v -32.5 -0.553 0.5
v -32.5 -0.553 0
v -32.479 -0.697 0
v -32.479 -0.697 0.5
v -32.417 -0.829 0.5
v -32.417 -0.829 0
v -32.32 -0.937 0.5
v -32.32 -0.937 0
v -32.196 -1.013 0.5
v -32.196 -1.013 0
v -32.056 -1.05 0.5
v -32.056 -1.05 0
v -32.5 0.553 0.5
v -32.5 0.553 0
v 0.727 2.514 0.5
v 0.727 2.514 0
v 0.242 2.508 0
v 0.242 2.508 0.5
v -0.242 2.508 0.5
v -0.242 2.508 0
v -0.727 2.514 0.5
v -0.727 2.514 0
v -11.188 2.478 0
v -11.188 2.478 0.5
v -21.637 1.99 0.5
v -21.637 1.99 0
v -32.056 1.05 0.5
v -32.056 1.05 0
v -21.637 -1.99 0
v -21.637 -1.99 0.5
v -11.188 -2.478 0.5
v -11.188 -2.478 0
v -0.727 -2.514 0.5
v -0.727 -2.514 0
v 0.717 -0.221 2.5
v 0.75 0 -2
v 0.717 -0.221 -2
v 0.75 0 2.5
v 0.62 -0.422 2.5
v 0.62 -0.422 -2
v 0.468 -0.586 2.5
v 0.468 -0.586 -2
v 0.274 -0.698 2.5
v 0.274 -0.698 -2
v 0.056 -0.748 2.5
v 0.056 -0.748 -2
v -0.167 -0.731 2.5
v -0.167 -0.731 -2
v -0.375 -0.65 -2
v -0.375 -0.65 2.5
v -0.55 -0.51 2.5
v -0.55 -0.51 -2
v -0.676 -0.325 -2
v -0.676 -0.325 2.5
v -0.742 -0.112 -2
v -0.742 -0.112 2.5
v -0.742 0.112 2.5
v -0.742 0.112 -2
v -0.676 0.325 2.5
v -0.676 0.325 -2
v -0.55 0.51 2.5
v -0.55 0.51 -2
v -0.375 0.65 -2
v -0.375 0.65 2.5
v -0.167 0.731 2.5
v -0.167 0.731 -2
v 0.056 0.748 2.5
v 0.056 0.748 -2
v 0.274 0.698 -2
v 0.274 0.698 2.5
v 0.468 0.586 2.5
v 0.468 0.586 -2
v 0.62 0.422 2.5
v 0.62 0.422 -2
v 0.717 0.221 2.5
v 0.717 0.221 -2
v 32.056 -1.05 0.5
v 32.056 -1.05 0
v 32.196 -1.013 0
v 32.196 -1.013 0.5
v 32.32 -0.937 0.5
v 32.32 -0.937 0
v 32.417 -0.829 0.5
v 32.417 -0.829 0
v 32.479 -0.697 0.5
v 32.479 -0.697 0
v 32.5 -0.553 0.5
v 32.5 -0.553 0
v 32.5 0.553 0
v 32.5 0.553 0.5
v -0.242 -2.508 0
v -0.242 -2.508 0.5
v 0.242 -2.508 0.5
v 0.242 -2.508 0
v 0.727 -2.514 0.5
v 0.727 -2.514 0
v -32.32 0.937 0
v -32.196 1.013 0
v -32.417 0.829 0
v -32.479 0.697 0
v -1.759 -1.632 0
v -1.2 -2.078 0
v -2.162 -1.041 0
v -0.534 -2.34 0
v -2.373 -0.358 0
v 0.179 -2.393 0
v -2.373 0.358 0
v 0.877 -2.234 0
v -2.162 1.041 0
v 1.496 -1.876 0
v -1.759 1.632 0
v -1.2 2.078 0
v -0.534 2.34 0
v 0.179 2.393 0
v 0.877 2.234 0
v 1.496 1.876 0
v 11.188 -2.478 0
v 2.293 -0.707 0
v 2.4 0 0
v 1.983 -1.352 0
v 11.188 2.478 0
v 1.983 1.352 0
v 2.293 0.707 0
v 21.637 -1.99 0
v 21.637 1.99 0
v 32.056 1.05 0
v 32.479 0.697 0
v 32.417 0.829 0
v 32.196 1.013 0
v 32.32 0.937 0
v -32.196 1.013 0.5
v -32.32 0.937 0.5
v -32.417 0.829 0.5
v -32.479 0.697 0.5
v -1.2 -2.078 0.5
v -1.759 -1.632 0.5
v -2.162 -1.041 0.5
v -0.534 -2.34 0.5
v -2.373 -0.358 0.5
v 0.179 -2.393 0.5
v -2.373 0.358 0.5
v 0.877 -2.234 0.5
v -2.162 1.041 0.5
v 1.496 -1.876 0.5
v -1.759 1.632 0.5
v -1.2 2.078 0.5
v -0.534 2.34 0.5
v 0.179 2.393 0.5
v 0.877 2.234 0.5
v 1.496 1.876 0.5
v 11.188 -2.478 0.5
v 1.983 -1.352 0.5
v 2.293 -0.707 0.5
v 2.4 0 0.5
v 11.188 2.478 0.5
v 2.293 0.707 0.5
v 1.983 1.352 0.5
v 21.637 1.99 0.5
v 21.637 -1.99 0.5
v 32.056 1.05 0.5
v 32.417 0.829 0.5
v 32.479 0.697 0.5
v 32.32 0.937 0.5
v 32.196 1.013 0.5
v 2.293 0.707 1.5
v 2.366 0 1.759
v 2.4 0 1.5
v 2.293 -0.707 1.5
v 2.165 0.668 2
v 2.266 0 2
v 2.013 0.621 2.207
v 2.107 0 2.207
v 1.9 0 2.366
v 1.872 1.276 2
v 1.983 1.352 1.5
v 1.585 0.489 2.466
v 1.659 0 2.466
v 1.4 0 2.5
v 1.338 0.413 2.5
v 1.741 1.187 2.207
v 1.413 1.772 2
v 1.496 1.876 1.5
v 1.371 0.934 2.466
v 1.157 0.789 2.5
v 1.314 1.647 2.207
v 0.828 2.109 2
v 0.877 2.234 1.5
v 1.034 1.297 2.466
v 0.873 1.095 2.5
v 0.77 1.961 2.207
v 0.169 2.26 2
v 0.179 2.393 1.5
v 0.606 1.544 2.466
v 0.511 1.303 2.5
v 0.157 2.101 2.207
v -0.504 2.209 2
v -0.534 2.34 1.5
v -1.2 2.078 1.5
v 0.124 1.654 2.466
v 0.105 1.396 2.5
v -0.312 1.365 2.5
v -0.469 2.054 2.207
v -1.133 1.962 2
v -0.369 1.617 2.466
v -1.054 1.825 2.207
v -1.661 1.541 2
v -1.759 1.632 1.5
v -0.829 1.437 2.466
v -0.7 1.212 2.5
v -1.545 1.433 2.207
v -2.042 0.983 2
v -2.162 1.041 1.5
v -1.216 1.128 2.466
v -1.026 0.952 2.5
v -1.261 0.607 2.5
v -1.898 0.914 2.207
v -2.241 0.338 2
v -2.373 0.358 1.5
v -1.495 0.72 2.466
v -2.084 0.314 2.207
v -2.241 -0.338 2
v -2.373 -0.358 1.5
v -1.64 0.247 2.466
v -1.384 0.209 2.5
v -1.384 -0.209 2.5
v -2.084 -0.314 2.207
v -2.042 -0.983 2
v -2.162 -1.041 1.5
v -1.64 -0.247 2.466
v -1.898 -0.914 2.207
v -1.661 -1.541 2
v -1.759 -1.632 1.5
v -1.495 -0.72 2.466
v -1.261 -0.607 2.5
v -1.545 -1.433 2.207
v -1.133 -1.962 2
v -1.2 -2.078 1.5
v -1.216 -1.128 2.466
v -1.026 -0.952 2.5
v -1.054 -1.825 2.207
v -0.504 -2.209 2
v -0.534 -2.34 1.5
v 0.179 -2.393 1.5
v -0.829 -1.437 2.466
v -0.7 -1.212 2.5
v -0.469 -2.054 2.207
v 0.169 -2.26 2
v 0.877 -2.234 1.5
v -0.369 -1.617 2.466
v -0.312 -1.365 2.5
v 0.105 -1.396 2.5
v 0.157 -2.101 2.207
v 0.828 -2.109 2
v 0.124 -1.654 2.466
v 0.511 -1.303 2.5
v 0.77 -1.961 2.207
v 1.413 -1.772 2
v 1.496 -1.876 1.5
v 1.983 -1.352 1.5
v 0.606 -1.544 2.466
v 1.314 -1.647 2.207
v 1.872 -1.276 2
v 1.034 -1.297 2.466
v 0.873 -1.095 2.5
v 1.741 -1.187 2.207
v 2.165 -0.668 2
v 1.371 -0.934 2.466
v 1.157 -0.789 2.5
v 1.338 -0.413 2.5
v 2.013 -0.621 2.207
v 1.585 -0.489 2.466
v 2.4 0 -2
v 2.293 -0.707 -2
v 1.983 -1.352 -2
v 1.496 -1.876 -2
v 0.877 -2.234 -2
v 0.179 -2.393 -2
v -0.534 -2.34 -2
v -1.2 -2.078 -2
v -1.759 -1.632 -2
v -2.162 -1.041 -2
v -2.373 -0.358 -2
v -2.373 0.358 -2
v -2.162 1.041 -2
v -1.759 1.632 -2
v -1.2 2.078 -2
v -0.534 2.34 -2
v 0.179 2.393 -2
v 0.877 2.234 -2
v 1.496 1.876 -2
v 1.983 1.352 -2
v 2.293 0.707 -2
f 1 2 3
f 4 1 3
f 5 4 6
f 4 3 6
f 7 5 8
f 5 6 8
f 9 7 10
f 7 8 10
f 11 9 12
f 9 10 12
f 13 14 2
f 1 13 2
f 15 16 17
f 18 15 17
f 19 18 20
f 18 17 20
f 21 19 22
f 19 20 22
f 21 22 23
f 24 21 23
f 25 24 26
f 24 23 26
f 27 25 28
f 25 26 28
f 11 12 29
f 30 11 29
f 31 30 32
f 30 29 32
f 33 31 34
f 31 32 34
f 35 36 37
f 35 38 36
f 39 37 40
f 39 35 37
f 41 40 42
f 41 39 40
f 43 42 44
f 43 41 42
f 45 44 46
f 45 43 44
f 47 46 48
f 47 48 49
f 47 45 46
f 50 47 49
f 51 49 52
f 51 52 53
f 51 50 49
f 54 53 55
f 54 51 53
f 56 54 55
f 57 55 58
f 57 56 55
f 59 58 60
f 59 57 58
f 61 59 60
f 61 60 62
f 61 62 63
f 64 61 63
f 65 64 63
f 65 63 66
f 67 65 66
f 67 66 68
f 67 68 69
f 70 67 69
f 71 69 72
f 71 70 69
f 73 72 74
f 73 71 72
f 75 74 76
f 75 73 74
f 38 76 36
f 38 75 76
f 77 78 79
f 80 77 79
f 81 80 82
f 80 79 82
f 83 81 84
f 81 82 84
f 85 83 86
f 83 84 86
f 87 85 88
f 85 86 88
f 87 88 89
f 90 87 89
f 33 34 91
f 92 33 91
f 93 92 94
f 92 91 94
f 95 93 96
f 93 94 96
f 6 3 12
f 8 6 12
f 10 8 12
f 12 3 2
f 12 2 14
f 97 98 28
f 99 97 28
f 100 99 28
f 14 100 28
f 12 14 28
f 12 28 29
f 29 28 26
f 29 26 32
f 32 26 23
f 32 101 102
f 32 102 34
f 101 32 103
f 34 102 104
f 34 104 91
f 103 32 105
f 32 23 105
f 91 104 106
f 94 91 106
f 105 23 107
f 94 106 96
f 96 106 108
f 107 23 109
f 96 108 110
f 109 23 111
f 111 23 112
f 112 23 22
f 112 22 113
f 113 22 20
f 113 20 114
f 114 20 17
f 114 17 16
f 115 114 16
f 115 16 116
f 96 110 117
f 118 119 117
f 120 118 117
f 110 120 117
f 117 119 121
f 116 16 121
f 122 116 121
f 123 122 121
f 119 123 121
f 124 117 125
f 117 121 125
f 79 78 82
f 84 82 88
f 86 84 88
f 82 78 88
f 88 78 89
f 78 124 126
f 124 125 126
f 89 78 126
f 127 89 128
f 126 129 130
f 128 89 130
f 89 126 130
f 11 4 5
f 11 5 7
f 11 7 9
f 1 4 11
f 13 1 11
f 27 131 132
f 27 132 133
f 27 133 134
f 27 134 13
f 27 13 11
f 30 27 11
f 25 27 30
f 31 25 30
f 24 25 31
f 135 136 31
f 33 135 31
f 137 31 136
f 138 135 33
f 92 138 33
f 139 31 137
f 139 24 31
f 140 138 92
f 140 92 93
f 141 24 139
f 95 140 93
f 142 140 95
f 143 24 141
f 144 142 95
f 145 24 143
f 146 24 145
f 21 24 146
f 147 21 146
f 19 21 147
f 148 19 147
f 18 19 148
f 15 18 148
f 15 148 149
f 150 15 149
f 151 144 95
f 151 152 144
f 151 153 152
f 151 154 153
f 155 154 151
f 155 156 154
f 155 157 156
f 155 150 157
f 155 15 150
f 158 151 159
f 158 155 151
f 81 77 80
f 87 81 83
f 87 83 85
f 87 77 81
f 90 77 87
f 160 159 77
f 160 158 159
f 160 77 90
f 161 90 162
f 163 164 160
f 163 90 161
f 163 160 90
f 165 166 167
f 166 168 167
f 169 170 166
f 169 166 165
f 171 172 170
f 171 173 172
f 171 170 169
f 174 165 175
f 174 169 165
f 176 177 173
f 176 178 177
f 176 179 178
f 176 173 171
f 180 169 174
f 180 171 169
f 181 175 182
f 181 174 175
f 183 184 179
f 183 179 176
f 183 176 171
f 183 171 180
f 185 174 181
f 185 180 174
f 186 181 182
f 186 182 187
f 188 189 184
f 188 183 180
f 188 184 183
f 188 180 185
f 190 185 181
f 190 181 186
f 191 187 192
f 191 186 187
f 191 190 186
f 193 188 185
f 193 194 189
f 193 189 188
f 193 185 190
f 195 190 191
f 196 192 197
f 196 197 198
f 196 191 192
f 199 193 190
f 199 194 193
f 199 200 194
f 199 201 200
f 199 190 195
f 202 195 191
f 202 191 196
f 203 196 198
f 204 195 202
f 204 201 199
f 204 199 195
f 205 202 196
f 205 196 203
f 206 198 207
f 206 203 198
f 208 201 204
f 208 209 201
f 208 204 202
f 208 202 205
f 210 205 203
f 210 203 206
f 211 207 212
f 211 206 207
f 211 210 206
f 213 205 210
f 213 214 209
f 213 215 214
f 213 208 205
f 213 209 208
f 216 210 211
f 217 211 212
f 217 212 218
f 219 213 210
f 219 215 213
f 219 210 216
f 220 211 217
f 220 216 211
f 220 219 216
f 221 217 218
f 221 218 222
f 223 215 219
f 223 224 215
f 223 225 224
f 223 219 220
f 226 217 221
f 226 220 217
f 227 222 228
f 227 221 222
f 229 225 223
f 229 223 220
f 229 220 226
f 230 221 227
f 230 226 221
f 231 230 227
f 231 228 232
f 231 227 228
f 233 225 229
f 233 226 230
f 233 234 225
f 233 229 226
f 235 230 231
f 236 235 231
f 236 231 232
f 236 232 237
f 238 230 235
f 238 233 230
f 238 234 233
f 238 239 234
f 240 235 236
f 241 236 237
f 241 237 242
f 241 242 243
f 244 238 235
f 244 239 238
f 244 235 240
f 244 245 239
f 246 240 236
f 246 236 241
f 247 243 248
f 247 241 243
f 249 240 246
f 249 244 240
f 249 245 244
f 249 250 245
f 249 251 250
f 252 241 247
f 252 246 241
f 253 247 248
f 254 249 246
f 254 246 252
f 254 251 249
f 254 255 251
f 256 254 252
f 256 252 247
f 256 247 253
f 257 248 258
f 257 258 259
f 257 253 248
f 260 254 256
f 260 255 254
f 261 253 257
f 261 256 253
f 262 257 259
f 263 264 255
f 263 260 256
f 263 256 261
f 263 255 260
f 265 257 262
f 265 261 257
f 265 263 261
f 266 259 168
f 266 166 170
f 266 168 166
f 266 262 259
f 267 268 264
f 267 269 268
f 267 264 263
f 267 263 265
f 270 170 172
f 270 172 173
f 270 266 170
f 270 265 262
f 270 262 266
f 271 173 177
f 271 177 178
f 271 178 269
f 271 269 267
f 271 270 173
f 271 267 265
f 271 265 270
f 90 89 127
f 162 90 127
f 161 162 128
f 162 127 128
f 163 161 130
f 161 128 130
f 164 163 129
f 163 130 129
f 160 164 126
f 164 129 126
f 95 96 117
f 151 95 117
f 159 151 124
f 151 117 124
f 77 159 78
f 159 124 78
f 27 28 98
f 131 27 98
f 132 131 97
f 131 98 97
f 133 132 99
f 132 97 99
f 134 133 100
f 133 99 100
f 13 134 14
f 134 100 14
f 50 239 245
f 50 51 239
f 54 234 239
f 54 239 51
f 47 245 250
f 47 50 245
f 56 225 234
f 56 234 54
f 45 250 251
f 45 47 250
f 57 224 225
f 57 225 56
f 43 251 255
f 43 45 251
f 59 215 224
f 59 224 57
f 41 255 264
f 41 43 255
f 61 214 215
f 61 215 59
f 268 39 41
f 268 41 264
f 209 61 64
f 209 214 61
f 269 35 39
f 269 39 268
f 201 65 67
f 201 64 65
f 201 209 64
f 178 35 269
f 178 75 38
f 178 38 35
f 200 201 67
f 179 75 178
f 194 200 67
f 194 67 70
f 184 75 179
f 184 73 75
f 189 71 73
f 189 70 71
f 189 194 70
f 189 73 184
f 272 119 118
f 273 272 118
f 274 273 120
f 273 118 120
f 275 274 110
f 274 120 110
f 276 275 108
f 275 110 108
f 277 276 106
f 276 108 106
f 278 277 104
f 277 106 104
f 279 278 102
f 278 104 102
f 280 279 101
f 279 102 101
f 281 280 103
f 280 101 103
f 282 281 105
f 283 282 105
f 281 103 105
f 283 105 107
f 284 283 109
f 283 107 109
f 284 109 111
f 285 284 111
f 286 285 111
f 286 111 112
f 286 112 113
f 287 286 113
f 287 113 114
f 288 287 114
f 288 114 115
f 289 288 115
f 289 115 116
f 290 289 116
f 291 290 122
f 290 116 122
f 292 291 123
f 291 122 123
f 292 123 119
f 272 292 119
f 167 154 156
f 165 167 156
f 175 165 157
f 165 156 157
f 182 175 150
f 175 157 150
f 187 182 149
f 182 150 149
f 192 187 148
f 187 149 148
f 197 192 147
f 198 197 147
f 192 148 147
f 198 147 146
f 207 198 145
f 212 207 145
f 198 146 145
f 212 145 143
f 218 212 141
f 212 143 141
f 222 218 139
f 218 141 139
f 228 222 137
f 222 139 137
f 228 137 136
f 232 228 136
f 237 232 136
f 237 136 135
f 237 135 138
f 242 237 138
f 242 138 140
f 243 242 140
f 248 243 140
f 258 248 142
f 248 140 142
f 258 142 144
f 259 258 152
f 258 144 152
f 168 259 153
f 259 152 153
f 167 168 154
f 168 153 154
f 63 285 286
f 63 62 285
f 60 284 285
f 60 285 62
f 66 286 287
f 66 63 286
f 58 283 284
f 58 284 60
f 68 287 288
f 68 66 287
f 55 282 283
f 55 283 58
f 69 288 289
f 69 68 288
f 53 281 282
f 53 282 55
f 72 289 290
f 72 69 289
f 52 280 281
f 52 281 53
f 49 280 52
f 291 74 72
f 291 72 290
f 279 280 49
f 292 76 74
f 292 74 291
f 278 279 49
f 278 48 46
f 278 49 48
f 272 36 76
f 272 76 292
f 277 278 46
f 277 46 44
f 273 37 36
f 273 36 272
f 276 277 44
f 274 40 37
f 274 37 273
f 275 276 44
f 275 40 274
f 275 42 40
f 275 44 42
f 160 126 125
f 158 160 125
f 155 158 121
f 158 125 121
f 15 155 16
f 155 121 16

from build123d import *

# Parameters (mm, degrees)
F0_R     = 0.75
F1_DEPTH = 0.5
F2_R     = 2.4
F2_R_2   = 0.75
F3_DEPTH = 2
F4_R     = 1
F5_R     = 2.4
F5_R_2   = 0.75
F6_DEPTH = 2


with BuildPart() as f1:
    # F0 (on Top) → F1 (new body)
    with BuildSketch(Plane.XY):
        with BuildLine():
            ThreePointArc((-32.0556782457, 1.0502037309), (-32.3727191455, 0.8866007898), (-32.5, 0.5533134684))
            Line((-32.5, 0.5533134684), (-32.5, -0.5533134684))
            ThreePointArc((-32.5, -0.5533134684), (-32.3727191455, -0.8866007898), (-32.0556782457, -1.0502037309))
            ThreePointArc((-32.0556782457, -1.0502037309), (-16.4153028407, -2.2906426773), (-0.7274094873, -2.5143248665))
            ThreePointArc((-0.7274094873, -2.5143248665), (0, -2.5077102626), (0.7274094873, -2.5143248665))
            ThreePointArc((0.7274094873, -2.5143248665), (16.4153028407, -2.2906426773), (32.0556782457, -1.0502037309))
            ThreePointArc((32.0556782457, -1.0502037309), (32.3727191455, -0.8866007898), (32.5, -0.5533134684))
            Line((32.5, -0.5533134684), (32.5, 0.5533134684))
            ThreePointArc((32.5, 0.5533134684), (32.3727191455, 0.8866007898), (32.0556782457, 1.0502037309))
            ThreePointArc((32.0556782457, 1.0502037309), (16.4153028407, 2.2906426773), (0.7274094872, 2.5143248666))
            ThreePointArc((0.7274094872, 2.5143248666), (0, 2.5077102626), (-0.7274094872, 2.5143248666))
            ThreePointArc((-0.7274094872, 2.5143248666), (-16.4153028407, 2.2906426773), (-32.0556782457, 1.0502037309))
        make_face()
        Circle(F0_R, mode=Mode.SUBTRACT)
    extrude(amount=F1_DEPTH)

    # F2 (on face) → F3 (join)
    with BuildSketch(Plane.XY.offset(0.5)):
        Circle(F2_R)
        Circle(F2_R_2, mode=Mode.SUBTRACT)
    extrude(amount=F3_DEPTH)

    # F4
    f4_edges = [f1.edges().sort_by_distance(p)[0] for p in [
        (-2.4, 0, 2.5),
    ]]
    fillet(f4_edges, radius=F4_R)

    # F5 (on face) → F6 (join)
    with BuildSketch(Plane(origin=(0, 0, 0), x_dir=(1, 0, 0), z_dir=(0, 0, -1))):
        Circle(F5_R)
        Circle(F5_R_2, mode=Mode.SUBTRACT)
    extrude(amount=F6_DEPTH)


solid = f1.part
